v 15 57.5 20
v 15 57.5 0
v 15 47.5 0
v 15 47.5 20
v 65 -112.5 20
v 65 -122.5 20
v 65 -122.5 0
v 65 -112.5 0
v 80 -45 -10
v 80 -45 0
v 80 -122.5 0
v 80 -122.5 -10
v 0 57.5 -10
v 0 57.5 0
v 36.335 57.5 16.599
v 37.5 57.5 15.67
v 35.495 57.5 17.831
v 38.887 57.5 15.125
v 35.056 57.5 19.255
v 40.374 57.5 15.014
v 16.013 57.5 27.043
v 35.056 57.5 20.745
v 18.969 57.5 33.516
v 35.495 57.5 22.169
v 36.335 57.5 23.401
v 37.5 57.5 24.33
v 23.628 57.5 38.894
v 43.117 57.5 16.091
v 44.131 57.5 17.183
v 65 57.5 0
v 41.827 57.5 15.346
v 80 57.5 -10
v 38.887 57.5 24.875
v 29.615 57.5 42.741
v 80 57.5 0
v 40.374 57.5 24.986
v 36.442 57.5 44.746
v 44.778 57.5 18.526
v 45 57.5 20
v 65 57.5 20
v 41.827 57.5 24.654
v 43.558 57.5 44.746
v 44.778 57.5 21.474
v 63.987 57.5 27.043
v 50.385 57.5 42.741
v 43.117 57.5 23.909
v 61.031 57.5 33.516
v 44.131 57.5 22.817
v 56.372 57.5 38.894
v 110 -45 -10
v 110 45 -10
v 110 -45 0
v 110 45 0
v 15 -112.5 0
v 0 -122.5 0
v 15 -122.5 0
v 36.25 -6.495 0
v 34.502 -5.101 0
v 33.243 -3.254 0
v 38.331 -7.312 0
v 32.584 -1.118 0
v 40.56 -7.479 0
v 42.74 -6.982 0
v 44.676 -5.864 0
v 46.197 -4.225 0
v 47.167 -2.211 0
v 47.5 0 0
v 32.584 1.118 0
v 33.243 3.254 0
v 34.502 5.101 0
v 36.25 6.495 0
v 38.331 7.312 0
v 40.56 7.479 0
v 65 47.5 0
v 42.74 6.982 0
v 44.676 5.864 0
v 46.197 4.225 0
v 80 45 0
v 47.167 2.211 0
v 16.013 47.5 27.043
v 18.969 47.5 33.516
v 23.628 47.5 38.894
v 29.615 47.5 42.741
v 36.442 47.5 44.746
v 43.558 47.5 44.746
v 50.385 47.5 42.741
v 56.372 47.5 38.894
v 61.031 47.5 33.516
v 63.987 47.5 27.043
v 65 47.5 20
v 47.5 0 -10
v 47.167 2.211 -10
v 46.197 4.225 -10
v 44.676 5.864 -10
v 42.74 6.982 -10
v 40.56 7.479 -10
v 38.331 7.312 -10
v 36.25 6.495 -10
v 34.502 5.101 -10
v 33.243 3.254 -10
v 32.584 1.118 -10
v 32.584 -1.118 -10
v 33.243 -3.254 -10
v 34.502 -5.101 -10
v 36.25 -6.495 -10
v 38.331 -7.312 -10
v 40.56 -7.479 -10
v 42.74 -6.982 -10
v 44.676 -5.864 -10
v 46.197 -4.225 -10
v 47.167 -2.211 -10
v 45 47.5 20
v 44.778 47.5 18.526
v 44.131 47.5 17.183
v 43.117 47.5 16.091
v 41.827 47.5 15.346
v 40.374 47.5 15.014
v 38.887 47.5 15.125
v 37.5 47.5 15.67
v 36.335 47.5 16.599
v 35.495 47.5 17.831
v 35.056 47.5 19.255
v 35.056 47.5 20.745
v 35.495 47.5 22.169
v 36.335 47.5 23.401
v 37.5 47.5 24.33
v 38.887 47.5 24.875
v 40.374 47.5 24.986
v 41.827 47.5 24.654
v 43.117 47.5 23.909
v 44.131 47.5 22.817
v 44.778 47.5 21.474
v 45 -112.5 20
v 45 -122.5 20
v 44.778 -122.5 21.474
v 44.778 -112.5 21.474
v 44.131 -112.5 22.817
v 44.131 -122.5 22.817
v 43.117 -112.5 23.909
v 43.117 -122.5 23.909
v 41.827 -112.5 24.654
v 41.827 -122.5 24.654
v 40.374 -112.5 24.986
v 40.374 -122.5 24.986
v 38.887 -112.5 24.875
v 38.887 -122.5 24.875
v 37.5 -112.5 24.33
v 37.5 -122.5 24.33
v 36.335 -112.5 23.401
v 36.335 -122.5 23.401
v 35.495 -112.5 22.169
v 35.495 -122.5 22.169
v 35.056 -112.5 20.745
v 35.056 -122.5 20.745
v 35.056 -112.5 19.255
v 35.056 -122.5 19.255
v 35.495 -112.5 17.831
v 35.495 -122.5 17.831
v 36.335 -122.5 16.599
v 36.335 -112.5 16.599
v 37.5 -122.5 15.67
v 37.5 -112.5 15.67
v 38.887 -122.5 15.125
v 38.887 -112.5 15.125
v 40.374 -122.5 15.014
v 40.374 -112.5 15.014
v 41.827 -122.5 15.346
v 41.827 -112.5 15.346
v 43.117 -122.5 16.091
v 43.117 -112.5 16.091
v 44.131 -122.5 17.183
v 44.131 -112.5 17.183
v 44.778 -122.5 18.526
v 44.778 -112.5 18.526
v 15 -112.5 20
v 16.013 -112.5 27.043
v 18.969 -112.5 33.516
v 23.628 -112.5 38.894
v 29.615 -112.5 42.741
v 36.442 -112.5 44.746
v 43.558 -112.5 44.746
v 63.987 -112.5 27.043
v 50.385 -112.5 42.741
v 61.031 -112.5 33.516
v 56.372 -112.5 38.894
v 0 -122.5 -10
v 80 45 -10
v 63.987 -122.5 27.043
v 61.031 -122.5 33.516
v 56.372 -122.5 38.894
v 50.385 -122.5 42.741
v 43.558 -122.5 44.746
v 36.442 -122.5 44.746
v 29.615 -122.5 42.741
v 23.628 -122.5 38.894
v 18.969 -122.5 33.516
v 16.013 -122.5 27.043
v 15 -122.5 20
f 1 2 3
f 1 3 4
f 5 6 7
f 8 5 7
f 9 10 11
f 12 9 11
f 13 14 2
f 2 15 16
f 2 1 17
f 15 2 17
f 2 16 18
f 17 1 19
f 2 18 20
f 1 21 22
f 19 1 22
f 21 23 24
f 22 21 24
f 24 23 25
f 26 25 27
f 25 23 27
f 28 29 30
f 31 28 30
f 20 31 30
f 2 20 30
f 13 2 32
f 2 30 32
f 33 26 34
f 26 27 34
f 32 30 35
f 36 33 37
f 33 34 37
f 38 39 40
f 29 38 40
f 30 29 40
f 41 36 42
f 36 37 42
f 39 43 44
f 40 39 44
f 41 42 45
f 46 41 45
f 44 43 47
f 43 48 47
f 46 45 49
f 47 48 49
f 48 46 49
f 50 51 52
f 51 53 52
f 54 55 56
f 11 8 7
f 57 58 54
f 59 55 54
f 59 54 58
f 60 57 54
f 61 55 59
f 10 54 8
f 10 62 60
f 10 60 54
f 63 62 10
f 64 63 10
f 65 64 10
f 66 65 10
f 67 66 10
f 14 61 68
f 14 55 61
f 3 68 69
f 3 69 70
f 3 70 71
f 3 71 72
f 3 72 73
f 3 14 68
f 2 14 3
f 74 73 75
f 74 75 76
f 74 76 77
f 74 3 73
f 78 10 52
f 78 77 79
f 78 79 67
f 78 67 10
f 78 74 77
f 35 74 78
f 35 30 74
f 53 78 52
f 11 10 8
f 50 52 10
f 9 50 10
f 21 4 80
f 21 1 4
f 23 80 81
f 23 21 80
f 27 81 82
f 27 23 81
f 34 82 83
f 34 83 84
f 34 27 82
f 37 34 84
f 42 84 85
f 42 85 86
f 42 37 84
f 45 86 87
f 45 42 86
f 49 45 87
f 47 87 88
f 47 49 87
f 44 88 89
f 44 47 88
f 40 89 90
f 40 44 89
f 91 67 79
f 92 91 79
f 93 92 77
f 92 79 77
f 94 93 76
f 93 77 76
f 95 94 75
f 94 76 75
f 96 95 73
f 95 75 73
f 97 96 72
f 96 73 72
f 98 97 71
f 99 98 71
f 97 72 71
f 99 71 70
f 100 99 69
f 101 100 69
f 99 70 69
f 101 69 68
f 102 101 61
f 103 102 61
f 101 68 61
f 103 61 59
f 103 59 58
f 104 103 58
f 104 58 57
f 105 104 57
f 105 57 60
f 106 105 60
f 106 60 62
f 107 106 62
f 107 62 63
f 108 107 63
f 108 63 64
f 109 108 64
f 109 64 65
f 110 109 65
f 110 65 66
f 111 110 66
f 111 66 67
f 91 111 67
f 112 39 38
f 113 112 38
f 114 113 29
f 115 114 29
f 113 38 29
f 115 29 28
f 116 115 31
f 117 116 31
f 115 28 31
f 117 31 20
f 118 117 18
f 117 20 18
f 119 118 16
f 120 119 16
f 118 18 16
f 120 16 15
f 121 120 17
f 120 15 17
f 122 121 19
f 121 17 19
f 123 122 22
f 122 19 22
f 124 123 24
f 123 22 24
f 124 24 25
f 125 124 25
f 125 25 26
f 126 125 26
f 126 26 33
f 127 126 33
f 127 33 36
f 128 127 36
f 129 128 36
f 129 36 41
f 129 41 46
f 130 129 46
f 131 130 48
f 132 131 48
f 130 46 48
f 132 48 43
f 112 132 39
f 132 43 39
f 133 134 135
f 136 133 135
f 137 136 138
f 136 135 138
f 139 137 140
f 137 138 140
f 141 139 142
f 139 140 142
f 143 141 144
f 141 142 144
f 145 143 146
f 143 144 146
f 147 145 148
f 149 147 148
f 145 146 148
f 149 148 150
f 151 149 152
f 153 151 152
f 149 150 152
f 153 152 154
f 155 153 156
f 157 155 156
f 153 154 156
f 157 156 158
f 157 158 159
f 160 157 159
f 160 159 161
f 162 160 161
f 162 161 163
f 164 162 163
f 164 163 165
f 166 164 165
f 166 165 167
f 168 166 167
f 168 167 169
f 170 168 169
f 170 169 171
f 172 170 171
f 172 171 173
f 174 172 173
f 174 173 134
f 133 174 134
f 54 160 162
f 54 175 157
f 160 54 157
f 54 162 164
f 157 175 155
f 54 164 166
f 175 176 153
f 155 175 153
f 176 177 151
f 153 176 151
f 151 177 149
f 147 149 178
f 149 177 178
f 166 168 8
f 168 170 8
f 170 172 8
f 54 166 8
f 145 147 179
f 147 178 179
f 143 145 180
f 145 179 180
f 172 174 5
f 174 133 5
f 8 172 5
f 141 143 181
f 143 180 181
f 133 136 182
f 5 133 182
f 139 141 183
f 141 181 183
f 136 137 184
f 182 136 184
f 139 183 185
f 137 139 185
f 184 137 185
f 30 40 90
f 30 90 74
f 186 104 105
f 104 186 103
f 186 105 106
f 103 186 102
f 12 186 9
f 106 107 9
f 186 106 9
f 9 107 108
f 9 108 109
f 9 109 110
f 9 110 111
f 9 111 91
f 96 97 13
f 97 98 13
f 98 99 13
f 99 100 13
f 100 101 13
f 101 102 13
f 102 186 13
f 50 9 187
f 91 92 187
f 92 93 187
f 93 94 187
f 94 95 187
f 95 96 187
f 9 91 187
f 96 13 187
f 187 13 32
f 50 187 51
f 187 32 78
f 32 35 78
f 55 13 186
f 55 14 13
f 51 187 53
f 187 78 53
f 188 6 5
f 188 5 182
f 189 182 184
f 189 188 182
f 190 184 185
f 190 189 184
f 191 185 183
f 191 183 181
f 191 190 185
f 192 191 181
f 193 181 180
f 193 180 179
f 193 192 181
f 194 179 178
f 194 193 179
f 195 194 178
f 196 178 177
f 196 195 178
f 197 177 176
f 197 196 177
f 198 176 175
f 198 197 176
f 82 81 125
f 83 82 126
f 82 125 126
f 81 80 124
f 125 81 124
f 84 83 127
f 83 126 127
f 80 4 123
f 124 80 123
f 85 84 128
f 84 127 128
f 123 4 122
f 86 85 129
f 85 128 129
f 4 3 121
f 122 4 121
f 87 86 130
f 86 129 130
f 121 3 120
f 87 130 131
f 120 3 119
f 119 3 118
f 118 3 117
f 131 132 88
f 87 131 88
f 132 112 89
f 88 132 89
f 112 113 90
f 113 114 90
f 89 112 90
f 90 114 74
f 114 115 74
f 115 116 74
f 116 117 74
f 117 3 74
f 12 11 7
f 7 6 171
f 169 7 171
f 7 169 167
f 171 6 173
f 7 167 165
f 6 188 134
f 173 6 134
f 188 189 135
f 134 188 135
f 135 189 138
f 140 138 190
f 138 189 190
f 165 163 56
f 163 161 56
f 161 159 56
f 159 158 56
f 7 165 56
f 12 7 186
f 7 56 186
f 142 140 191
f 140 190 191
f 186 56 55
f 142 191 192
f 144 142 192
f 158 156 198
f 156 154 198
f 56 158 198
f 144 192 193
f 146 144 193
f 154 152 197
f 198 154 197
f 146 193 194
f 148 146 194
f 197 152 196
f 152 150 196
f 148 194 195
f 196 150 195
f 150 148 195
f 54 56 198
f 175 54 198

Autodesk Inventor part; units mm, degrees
ref_plane "YZ Plane" through (0, 0, 0) normal (1, 0, 0) x (0, 1, 0)
ref_plane "XZ Plane" through (0, 0, 0) normal (0, 1, 0) x (-1, 0, 0)
ref_plane "XY Plane" through (0, 0, 0) normal (0, 0, 1) x (1, 0, 0)
sketch "스케치1" plane through (0, 0, 0) normal (0, 0, 1) x (1, 0, 0)
  line L0 (80, -122.5) -> (0, -122.5)
  line L1 (80, 45) -> (110, 45)
  line L2 (110, 45) -> (110, -45)
  line L3 (110, -45) -> (80, -45)
  line L4 (80, 57.5) -> (80, 45)
  line L5 (80, -45) -> (80, -122.5)
  line L6 (40, 57.5) -> (40, -122.5)
  circle A0 centre (40, 47.0427) radius 7.5
  circle A1 centre (-7.0427, 0) radius 7.5
  circle A2 centre (40, -47.0427) radius 7.5
  circle A3 centre (87.0427, 0) radius 7.5
  circle A4 centre (40, 0) radius 7.5
  line L7 (0, 57.5) -> (80, 57.5)
  line L8 (0, 0) -> (0, 57.5)
  line L9 (0, 0) -> (0, -122.5)
  dimension "d0" = 80
  dimension "d3" = 45
  dimension "d4" = 45
  dimension "d13" = 360
  dimension "d14" = 0
  dimension "d15" = 47.0427
  dimension "d16" = 47.0427
  dimension "d21" = 15
  dimension "d31" = 122.5
  dimension "d36" = 12.5
  dimension "d37" = 30
extrude "돌출1" add sketch "스케치1" against normal blind 10 contours L0 L6 A2 A4 A0 L7 L4 L1 L2 L3 L5 | L0 L9 A1 L8 L7 L6 A0 A4 A2 | A2 L6 | L6 A2 | L9 L8 A1 | A4 L6 | L6 A4 | A0 L6 | L6 A0 | A3 picked at (0.0843, 1.4393)
extrude "돌출3" cut sketch "스케치1" against normal blind 40 contours A4 L6 | L6 A4
sketch "스케치2" plane through (0, -122.5, 0) normal (0, -1, 0) x (1, 0, 0)
  line L0 (0, 0) -> (80, 0) projected
  line L1 (15, 0) -> (15, 20)
  line L2 (15, 20) -> (65, 20)
  line L3 (65, 20) -> (65, 0)
  arc A0 (65, 20) -> (15, 20) centre (40, 20) ccw
  circle A1 centre (40, 20) radius 5
  point P0 (40, 0)
  dimension "d24" = 20
  dimension "d25" = 50
  dimension "d26" = 25
  dimension "d28" = 10
extrude "돌출4" add sketch "스케치2" against normal blind 10 contours L1 L2 A1 L3 L0 | A0 L2 A1
sketch "스케치3" plane through (0, 57.5, 0) normal (0, 1, 0) x (1, 0, 0)
  line L0 (15, 0) -> (15, -20) projected
  line L1 (65, -20) -> (65, 0) projected
  arc A0 (15, -20) -> (65, -20) centre (40, -20) ccw projected
  circle A1 centre (40, -20) radius 5 projected
  line L2 (80, 0) -> (0, 0) projected
extrude "돌출5" add sketch "스케치3" against normal blind 10
properties part number "wheel_braket_front"
